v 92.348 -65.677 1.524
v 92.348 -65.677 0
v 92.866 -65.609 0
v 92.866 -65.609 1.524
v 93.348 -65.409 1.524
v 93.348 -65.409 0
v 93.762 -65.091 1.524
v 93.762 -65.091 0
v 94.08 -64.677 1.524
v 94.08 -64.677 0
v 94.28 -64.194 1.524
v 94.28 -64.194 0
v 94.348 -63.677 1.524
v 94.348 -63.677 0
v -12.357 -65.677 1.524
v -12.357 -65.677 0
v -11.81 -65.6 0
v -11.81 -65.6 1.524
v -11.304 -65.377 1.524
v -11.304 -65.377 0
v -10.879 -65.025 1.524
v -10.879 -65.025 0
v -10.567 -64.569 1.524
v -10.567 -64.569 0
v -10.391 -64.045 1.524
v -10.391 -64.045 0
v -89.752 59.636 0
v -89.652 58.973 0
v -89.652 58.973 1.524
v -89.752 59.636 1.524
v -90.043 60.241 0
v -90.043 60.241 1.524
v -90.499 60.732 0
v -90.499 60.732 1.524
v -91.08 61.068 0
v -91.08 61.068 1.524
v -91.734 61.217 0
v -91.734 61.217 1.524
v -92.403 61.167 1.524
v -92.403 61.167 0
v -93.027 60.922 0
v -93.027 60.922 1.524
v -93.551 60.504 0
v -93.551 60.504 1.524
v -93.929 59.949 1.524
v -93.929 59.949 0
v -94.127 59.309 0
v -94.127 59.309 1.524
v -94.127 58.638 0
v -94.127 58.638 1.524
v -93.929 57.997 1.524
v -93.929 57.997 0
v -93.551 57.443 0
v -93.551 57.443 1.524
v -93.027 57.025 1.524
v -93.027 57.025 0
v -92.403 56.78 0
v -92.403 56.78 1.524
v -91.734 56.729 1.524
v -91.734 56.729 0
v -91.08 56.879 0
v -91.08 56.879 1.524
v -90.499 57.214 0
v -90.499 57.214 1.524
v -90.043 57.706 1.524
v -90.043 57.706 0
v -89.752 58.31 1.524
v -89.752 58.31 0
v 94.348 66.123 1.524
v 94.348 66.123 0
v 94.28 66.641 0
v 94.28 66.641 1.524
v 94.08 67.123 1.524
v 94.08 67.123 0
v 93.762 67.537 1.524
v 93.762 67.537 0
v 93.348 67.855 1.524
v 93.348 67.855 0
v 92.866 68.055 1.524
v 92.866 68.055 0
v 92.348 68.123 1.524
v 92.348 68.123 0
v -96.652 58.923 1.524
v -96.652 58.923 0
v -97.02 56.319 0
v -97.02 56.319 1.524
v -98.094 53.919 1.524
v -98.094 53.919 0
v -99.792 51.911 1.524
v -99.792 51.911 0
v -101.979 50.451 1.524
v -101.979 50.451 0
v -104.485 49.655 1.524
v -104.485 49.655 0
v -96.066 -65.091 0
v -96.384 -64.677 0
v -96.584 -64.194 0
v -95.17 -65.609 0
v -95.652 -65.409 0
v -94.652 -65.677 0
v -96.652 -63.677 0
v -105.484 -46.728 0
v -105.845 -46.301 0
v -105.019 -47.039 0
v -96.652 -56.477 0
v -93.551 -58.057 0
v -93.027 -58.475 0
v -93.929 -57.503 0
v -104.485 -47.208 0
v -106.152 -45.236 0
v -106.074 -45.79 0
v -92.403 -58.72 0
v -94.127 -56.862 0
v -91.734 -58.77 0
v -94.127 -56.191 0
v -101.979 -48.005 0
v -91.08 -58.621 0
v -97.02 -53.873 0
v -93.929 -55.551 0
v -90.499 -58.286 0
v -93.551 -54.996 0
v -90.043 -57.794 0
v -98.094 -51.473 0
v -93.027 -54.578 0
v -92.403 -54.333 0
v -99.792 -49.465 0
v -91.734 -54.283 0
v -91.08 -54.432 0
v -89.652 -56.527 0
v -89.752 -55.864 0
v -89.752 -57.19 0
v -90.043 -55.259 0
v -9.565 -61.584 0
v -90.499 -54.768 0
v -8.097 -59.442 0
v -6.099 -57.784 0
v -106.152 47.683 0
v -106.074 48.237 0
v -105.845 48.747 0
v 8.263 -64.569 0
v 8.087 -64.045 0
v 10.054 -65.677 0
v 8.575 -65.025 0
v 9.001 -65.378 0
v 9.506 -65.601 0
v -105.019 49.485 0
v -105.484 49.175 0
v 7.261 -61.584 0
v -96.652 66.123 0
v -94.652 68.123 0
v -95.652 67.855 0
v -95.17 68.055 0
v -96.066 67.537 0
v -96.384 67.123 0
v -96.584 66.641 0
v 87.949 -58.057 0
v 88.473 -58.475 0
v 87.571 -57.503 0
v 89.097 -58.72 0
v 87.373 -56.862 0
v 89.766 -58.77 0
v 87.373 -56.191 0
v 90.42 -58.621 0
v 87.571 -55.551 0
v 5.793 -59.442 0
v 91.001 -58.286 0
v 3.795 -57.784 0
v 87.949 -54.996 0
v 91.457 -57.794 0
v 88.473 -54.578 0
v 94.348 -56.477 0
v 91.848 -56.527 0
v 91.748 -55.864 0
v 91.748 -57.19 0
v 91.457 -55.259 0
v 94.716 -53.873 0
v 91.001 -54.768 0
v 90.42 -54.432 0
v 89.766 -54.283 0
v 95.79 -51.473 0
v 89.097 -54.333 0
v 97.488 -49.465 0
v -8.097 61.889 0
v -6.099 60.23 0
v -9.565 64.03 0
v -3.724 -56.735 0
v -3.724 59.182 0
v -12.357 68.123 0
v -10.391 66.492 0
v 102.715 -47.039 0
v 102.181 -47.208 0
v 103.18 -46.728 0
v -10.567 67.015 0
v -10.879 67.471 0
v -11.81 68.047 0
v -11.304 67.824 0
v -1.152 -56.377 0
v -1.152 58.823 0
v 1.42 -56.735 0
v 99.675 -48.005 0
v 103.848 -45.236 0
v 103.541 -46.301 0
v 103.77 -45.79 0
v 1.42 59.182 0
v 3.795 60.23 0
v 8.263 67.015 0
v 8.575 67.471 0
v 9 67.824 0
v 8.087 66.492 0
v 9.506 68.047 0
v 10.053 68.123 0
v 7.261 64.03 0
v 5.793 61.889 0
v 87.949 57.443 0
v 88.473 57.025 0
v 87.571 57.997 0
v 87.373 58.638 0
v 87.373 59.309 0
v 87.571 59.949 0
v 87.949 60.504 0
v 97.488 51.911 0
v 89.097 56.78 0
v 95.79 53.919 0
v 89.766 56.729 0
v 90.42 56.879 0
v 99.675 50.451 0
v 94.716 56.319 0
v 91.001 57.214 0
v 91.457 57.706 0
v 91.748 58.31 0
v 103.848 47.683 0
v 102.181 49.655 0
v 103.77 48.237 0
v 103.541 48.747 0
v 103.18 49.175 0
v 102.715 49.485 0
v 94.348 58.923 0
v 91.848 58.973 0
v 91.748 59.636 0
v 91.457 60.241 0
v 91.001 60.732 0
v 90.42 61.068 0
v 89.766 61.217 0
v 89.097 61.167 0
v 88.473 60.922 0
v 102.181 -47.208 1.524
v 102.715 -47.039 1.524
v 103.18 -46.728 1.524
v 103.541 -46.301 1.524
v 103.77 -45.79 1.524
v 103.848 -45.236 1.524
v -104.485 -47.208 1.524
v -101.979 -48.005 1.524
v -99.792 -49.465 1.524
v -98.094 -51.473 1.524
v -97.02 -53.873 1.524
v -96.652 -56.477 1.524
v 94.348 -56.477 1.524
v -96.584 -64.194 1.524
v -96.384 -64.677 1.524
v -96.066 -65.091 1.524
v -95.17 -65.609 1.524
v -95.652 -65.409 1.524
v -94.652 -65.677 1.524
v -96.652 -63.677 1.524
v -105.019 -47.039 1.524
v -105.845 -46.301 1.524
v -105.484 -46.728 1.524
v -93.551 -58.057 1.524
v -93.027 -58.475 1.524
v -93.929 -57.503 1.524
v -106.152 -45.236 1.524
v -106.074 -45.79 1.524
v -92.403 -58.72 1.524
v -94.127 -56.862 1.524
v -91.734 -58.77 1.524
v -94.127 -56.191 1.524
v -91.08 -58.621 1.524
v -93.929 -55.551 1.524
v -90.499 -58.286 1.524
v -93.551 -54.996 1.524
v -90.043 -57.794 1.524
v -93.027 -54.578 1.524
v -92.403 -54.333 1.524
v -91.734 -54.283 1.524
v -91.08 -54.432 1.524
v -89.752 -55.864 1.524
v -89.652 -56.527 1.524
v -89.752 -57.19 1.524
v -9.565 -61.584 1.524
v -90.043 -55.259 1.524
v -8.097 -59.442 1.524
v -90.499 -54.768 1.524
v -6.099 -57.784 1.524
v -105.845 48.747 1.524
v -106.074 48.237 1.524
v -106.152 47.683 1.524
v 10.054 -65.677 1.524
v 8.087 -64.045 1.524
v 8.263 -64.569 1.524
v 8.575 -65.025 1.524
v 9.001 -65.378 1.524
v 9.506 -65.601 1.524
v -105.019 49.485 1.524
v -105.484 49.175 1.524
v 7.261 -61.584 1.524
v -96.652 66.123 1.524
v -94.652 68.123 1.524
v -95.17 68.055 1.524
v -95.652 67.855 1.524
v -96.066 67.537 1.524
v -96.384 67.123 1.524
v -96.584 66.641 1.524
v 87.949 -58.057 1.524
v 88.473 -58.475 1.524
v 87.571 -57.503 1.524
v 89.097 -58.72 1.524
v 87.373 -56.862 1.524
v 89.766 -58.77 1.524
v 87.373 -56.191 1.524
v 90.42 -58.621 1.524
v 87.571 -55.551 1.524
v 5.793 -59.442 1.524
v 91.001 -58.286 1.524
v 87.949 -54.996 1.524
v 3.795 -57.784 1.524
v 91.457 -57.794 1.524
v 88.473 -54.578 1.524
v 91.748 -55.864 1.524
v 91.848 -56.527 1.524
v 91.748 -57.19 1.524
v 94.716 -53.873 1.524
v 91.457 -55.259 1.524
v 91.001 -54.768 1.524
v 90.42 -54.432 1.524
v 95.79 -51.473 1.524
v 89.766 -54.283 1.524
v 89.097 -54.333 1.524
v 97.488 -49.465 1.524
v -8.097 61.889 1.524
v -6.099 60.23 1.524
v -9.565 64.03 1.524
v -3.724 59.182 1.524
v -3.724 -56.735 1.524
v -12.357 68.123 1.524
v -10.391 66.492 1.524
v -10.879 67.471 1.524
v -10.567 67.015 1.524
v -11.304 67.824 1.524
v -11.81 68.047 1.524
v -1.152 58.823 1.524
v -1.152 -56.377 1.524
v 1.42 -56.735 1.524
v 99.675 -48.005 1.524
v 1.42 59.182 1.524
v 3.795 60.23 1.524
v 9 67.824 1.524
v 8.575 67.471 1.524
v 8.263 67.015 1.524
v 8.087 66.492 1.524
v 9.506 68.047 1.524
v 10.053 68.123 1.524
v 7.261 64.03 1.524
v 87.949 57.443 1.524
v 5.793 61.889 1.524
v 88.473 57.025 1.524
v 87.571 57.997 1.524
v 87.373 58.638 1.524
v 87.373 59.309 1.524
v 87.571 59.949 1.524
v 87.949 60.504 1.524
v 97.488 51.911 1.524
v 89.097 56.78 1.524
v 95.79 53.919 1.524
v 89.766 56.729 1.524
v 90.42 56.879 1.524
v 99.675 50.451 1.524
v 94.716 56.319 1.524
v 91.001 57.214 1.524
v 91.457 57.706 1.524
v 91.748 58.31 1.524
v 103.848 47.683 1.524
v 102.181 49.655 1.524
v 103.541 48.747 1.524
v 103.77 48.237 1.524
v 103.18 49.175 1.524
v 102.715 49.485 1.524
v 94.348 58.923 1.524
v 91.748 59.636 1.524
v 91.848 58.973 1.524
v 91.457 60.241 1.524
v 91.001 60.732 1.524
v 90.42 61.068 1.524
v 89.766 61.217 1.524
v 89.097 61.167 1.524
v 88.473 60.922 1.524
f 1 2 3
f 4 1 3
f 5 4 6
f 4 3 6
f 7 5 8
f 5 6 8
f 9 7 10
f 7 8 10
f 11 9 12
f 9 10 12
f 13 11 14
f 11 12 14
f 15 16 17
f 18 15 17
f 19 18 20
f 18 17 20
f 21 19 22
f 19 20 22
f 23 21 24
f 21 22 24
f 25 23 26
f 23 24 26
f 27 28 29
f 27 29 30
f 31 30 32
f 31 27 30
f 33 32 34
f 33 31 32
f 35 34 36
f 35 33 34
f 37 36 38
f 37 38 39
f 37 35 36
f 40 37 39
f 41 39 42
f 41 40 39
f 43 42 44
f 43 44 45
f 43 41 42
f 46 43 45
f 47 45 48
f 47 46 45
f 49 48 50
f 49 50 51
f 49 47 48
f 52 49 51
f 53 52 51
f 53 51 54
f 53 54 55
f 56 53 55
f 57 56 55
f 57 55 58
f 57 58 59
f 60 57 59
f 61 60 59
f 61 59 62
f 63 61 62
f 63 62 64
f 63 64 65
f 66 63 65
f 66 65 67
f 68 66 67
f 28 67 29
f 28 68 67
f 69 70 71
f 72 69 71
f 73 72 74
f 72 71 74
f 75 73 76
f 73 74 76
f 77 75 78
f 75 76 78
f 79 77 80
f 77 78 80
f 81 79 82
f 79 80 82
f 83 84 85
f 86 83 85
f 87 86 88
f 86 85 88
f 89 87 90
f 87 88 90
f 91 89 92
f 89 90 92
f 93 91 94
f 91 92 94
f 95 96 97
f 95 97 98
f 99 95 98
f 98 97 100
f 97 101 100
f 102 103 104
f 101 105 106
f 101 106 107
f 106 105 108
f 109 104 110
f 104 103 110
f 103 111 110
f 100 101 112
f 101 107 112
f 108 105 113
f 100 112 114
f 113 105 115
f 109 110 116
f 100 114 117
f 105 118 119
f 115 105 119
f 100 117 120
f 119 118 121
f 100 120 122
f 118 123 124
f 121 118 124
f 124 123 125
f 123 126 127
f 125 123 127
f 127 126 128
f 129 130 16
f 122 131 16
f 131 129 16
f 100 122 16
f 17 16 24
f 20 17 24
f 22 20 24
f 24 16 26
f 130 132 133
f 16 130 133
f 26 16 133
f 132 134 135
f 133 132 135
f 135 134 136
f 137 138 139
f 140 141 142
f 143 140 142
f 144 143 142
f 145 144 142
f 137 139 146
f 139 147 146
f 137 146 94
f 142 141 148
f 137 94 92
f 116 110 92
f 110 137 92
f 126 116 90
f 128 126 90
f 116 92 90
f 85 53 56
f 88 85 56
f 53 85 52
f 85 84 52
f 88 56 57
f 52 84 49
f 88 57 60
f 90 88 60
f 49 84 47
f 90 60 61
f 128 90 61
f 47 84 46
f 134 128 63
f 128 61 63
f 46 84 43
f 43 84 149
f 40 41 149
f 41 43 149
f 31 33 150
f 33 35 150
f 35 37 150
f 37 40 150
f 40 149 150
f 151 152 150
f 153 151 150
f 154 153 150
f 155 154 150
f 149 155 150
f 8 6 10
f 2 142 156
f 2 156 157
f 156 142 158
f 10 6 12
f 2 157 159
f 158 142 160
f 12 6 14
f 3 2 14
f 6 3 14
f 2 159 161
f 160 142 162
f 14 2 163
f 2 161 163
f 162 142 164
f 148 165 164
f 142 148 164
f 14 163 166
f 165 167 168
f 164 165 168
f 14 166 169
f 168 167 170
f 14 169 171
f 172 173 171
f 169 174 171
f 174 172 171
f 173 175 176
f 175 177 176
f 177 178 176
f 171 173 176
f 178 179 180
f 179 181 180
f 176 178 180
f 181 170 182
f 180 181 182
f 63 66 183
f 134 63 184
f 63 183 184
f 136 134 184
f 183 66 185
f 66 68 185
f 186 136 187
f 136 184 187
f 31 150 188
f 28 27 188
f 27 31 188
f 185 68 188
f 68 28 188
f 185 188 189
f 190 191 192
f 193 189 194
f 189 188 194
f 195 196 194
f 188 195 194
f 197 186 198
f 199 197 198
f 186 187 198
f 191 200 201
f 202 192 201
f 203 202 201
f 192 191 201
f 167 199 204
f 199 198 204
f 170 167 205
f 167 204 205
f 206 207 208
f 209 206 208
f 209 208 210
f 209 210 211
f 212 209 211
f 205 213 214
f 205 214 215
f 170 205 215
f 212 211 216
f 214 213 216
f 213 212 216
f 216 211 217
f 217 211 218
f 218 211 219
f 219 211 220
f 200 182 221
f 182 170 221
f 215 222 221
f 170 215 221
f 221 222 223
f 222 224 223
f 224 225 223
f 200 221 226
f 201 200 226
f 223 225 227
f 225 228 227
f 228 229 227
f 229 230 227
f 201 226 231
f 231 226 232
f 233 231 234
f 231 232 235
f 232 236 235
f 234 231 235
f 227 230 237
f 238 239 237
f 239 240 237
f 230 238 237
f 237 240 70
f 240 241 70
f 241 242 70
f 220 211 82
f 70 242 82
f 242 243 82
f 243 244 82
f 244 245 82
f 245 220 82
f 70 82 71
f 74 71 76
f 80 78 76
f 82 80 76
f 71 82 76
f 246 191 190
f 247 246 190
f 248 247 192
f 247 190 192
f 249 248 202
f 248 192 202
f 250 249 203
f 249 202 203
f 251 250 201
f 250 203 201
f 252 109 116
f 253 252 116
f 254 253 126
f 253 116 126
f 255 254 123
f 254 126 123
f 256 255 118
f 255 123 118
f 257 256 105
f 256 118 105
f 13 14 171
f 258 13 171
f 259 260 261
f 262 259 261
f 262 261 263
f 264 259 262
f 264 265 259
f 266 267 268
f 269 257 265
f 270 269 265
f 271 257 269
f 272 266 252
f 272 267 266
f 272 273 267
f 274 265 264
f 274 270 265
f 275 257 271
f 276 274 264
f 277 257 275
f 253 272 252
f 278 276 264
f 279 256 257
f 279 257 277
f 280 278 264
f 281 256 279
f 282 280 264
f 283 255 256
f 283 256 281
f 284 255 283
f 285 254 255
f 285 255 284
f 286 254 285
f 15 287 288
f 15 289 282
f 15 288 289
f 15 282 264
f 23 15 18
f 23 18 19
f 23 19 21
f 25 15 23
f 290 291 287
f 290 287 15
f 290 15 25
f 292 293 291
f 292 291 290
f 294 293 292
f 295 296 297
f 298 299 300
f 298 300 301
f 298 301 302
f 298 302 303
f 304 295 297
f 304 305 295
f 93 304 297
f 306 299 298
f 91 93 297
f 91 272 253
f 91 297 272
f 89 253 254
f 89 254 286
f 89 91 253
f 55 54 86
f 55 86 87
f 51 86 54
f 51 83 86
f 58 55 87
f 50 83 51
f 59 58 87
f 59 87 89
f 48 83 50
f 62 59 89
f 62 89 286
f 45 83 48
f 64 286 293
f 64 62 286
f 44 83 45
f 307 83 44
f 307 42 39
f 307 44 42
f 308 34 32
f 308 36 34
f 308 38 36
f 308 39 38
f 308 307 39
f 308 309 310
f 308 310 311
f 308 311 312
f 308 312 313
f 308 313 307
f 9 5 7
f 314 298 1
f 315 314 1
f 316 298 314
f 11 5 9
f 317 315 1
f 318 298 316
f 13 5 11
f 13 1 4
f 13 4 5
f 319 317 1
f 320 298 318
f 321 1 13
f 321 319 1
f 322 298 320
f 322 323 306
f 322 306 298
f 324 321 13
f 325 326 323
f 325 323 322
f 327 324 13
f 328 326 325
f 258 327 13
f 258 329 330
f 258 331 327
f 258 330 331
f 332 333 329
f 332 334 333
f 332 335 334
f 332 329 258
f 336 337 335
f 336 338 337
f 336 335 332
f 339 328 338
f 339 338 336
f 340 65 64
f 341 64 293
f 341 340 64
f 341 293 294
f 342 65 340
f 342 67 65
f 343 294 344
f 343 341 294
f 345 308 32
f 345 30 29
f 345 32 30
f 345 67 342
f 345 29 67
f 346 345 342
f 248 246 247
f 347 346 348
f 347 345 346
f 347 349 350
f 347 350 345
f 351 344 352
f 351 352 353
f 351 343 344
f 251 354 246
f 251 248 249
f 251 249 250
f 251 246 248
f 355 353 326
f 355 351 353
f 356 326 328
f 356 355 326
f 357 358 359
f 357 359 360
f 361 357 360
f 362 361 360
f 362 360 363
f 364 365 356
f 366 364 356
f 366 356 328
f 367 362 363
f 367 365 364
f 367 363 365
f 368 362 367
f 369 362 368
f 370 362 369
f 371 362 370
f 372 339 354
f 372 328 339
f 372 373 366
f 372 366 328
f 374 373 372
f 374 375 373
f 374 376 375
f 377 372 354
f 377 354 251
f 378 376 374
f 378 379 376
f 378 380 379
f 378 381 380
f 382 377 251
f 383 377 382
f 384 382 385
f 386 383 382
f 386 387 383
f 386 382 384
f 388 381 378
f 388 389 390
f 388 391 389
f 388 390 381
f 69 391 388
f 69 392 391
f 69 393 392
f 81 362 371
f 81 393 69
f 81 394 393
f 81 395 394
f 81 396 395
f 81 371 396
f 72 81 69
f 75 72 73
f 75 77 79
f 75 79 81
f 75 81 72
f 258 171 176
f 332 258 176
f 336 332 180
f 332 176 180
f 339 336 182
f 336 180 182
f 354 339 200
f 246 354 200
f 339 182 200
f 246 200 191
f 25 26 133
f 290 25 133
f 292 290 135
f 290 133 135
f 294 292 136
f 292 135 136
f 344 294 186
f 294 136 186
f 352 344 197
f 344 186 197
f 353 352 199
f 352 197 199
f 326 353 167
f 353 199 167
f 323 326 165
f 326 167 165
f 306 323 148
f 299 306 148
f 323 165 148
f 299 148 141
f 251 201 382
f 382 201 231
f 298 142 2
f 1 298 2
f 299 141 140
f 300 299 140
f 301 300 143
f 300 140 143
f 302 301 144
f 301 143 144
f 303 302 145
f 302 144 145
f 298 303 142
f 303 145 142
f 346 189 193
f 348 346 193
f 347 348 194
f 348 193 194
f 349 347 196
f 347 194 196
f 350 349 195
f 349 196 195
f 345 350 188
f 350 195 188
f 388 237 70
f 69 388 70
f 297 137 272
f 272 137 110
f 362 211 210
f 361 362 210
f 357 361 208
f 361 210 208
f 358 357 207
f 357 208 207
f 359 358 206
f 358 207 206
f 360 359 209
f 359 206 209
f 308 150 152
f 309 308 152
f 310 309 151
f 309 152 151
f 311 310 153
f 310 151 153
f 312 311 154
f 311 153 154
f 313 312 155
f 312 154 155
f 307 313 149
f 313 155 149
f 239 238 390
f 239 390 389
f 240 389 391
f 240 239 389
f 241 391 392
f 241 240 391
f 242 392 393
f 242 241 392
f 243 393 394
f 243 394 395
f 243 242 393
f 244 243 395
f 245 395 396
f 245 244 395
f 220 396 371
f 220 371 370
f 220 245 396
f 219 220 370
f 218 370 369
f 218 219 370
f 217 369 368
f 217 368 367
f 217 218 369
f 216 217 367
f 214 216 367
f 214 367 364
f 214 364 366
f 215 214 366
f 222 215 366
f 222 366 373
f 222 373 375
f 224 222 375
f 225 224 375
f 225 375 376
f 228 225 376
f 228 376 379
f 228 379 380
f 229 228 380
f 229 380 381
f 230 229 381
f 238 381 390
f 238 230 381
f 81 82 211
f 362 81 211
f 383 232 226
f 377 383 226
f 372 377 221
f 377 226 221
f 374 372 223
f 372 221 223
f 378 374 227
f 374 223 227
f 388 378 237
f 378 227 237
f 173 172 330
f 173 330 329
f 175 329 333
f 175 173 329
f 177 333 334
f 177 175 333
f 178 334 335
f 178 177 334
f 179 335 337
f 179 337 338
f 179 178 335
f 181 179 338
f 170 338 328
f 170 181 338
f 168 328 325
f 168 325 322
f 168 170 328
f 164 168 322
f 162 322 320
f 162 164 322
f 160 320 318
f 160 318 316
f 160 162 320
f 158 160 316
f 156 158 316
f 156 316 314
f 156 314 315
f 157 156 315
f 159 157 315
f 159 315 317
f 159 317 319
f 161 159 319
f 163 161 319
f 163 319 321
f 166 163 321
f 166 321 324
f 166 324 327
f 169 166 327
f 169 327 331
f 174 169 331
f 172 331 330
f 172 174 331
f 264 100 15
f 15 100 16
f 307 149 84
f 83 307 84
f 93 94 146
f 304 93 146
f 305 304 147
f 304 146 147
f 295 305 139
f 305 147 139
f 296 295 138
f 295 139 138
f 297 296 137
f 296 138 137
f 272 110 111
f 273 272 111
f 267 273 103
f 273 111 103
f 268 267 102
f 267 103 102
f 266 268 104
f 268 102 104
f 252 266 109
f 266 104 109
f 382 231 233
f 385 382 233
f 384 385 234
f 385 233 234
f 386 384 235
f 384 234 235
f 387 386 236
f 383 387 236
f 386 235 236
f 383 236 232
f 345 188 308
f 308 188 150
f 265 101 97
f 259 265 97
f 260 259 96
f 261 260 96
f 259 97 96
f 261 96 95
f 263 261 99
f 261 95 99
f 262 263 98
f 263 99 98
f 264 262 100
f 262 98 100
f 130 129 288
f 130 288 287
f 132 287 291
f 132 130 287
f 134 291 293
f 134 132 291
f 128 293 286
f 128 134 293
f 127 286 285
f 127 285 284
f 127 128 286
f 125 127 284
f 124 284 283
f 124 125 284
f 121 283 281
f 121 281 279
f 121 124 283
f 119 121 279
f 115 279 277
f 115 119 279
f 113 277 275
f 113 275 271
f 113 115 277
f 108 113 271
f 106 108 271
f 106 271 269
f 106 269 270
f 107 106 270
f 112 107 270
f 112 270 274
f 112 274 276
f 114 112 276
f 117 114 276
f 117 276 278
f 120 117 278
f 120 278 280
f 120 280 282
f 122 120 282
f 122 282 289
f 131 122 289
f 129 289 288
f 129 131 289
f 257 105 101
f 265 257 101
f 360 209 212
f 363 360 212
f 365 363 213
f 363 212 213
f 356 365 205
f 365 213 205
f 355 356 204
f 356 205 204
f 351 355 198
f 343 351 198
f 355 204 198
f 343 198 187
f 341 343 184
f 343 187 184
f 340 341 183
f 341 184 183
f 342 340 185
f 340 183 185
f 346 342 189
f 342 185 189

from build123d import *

# Parameters (mm, degrees)
F0_R     = 2.2500080016
F1_DEPTH = 1.524


# Not quite as in the source:
# - ends of sketch curves that miss each other by under 0.0002 mm in the source are joined


with BuildPart() as f1:
    # F0 (on Top) → F1 (new body)
    with BuildSketch(Plane.XY):
        with BuildLine():
            Line((-94.6519925541, -65.6767721), (-12.3569142118, -65.6767975))
            ThreePointArc((-12.3569142118, -65.6767975), (-11.0795804522, -65.2157564043), (-10.3911484863, -64.0452001887))
            ThreePointArc((-10.3911484863, -64.0452001887), (-1.1520076605, -56.3767915202), (8.0871293483, -64.0452047877))
            ThreePointArc((8.0871293483, -64.0452047877), (8.7758066433, -65.2159392609), (10.0535111494, -65.6767720058))
            Line((10.0535111494, -65.6767720058), (92.3479979541, -65.6767721))
            ThreePointArc((92.3479979541, -65.6767721), (93.7621995832, -65.0909958659), (94.3479937777, -63.6768016764))
            Line((94.3479937777, -63.6768016764), (94.3479937777, -56.4767913114))
            ThreePointArc((94.3479937777, -56.4767913114), (96.5686254579, -50.4091149721), (102.1813285767, -47.2082611927))
            ThreePointArc((102.1813285767, -47.2082611927), (103.3755112292, -46.5272203825), (103.8479739399, -45.2362255027))
            Line((103.8479739399, -45.2362255027), (103.8479739399, 47.6826559027))
            ThreePointArc((103.8479739399, 47.6826559027), (103.3755051193, 48.9736417855), (102.18132591, 49.6546758171))
            ThreePointArc((102.18132591, 49.6546758171), (96.5686275458, 52.8555266753), (94.3479937777, 58.9231963114))
            Line((94.3479937777, 58.9231963114), (94.3479937777, 66.1232066764))
            ThreePointArc((94.3479937777, 66.1232066764), (93.7622085633, 67.5374172856), (92.3479979541, 68.1232025))
            Line((92.3479979541, 68.1232025), (10.0528942103, 68.1232351277))
            ThreePointArc((10.0528942103, 68.1232351277), (8.7755585629, 67.662193921), (8.0871263436, 66.4916357508))
            ThreePointArc((8.0871263436, 66.4916357508), (-1.1520108709, 58.8232175176), (-10.3911530852, 66.4916297269))
            ThreePointArc((-10.3911530852, 66.4916297269), (-11.0795900575, 67.6621693766), (-12.3569142118, 68.1232025))
            Line((-12.3569142118, 68.1232025), (-94.6519925541, 68.1232025))
            ThreePointArc((-94.6519925541, 68.1232025), (-96.0662031633, 67.5374172856), (-96.6519883777, 66.1232066764))
            Line((-96.6519883777, 66.1232066764), (-96.6519883777, 58.9231963114))
            ThreePointArc((-96.6519883777, 58.9231963114), (-98.8726186915, 52.8555215887), (-104.4853190025, 49.6546668983))
            ThreePointArc((-104.4853190025, 49.6546668983), (-105.6795170362, 48.9736513496), (-106.1519939399, 47.6826559027))
            Line((-106.1519939399, 47.6826559027), (-106.1519939399, -45.2362255027))
            ThreePointArc((-106.1519939399, -45.2362255027), (-105.6795170362, -46.5272209496), (-104.4853212157, -47.2082495912))
            ThreePointArc((-104.4853212157, -47.2082495912), (-98.8726200579, -50.4091149721), (-96.6519883777, -56.4767913114))
            Line((-96.6519883777, -56.4767913114), (-96.6519883777, -63.6768016764))
            ThreePointArc((-96.6519883777, -63.6768016764), (-96.0661941832, -65.0909958659), (-94.6519925541, -65.6767721))
        make_face()
        with Locations((-91.9019855966, -56.526778507)):
            Circle(F0_R, mode=Mode.SUBTRACT)
        with Locations((89.5979909966, -56.526778507)):
            Circle(F0_R, mode=Mode.SUBTRACT)
        with Locations((-91.9019855966, 58.973208907)):
            Circle(F0_R, mode=Mode.SUBTRACT)
        with Locations((89.5979909966, 58.973208907)):
            Circle(F0_R, mode=Mode.SUBTRACT)
    extrude(amount=F1_DEPTH)


solid = f1.part
